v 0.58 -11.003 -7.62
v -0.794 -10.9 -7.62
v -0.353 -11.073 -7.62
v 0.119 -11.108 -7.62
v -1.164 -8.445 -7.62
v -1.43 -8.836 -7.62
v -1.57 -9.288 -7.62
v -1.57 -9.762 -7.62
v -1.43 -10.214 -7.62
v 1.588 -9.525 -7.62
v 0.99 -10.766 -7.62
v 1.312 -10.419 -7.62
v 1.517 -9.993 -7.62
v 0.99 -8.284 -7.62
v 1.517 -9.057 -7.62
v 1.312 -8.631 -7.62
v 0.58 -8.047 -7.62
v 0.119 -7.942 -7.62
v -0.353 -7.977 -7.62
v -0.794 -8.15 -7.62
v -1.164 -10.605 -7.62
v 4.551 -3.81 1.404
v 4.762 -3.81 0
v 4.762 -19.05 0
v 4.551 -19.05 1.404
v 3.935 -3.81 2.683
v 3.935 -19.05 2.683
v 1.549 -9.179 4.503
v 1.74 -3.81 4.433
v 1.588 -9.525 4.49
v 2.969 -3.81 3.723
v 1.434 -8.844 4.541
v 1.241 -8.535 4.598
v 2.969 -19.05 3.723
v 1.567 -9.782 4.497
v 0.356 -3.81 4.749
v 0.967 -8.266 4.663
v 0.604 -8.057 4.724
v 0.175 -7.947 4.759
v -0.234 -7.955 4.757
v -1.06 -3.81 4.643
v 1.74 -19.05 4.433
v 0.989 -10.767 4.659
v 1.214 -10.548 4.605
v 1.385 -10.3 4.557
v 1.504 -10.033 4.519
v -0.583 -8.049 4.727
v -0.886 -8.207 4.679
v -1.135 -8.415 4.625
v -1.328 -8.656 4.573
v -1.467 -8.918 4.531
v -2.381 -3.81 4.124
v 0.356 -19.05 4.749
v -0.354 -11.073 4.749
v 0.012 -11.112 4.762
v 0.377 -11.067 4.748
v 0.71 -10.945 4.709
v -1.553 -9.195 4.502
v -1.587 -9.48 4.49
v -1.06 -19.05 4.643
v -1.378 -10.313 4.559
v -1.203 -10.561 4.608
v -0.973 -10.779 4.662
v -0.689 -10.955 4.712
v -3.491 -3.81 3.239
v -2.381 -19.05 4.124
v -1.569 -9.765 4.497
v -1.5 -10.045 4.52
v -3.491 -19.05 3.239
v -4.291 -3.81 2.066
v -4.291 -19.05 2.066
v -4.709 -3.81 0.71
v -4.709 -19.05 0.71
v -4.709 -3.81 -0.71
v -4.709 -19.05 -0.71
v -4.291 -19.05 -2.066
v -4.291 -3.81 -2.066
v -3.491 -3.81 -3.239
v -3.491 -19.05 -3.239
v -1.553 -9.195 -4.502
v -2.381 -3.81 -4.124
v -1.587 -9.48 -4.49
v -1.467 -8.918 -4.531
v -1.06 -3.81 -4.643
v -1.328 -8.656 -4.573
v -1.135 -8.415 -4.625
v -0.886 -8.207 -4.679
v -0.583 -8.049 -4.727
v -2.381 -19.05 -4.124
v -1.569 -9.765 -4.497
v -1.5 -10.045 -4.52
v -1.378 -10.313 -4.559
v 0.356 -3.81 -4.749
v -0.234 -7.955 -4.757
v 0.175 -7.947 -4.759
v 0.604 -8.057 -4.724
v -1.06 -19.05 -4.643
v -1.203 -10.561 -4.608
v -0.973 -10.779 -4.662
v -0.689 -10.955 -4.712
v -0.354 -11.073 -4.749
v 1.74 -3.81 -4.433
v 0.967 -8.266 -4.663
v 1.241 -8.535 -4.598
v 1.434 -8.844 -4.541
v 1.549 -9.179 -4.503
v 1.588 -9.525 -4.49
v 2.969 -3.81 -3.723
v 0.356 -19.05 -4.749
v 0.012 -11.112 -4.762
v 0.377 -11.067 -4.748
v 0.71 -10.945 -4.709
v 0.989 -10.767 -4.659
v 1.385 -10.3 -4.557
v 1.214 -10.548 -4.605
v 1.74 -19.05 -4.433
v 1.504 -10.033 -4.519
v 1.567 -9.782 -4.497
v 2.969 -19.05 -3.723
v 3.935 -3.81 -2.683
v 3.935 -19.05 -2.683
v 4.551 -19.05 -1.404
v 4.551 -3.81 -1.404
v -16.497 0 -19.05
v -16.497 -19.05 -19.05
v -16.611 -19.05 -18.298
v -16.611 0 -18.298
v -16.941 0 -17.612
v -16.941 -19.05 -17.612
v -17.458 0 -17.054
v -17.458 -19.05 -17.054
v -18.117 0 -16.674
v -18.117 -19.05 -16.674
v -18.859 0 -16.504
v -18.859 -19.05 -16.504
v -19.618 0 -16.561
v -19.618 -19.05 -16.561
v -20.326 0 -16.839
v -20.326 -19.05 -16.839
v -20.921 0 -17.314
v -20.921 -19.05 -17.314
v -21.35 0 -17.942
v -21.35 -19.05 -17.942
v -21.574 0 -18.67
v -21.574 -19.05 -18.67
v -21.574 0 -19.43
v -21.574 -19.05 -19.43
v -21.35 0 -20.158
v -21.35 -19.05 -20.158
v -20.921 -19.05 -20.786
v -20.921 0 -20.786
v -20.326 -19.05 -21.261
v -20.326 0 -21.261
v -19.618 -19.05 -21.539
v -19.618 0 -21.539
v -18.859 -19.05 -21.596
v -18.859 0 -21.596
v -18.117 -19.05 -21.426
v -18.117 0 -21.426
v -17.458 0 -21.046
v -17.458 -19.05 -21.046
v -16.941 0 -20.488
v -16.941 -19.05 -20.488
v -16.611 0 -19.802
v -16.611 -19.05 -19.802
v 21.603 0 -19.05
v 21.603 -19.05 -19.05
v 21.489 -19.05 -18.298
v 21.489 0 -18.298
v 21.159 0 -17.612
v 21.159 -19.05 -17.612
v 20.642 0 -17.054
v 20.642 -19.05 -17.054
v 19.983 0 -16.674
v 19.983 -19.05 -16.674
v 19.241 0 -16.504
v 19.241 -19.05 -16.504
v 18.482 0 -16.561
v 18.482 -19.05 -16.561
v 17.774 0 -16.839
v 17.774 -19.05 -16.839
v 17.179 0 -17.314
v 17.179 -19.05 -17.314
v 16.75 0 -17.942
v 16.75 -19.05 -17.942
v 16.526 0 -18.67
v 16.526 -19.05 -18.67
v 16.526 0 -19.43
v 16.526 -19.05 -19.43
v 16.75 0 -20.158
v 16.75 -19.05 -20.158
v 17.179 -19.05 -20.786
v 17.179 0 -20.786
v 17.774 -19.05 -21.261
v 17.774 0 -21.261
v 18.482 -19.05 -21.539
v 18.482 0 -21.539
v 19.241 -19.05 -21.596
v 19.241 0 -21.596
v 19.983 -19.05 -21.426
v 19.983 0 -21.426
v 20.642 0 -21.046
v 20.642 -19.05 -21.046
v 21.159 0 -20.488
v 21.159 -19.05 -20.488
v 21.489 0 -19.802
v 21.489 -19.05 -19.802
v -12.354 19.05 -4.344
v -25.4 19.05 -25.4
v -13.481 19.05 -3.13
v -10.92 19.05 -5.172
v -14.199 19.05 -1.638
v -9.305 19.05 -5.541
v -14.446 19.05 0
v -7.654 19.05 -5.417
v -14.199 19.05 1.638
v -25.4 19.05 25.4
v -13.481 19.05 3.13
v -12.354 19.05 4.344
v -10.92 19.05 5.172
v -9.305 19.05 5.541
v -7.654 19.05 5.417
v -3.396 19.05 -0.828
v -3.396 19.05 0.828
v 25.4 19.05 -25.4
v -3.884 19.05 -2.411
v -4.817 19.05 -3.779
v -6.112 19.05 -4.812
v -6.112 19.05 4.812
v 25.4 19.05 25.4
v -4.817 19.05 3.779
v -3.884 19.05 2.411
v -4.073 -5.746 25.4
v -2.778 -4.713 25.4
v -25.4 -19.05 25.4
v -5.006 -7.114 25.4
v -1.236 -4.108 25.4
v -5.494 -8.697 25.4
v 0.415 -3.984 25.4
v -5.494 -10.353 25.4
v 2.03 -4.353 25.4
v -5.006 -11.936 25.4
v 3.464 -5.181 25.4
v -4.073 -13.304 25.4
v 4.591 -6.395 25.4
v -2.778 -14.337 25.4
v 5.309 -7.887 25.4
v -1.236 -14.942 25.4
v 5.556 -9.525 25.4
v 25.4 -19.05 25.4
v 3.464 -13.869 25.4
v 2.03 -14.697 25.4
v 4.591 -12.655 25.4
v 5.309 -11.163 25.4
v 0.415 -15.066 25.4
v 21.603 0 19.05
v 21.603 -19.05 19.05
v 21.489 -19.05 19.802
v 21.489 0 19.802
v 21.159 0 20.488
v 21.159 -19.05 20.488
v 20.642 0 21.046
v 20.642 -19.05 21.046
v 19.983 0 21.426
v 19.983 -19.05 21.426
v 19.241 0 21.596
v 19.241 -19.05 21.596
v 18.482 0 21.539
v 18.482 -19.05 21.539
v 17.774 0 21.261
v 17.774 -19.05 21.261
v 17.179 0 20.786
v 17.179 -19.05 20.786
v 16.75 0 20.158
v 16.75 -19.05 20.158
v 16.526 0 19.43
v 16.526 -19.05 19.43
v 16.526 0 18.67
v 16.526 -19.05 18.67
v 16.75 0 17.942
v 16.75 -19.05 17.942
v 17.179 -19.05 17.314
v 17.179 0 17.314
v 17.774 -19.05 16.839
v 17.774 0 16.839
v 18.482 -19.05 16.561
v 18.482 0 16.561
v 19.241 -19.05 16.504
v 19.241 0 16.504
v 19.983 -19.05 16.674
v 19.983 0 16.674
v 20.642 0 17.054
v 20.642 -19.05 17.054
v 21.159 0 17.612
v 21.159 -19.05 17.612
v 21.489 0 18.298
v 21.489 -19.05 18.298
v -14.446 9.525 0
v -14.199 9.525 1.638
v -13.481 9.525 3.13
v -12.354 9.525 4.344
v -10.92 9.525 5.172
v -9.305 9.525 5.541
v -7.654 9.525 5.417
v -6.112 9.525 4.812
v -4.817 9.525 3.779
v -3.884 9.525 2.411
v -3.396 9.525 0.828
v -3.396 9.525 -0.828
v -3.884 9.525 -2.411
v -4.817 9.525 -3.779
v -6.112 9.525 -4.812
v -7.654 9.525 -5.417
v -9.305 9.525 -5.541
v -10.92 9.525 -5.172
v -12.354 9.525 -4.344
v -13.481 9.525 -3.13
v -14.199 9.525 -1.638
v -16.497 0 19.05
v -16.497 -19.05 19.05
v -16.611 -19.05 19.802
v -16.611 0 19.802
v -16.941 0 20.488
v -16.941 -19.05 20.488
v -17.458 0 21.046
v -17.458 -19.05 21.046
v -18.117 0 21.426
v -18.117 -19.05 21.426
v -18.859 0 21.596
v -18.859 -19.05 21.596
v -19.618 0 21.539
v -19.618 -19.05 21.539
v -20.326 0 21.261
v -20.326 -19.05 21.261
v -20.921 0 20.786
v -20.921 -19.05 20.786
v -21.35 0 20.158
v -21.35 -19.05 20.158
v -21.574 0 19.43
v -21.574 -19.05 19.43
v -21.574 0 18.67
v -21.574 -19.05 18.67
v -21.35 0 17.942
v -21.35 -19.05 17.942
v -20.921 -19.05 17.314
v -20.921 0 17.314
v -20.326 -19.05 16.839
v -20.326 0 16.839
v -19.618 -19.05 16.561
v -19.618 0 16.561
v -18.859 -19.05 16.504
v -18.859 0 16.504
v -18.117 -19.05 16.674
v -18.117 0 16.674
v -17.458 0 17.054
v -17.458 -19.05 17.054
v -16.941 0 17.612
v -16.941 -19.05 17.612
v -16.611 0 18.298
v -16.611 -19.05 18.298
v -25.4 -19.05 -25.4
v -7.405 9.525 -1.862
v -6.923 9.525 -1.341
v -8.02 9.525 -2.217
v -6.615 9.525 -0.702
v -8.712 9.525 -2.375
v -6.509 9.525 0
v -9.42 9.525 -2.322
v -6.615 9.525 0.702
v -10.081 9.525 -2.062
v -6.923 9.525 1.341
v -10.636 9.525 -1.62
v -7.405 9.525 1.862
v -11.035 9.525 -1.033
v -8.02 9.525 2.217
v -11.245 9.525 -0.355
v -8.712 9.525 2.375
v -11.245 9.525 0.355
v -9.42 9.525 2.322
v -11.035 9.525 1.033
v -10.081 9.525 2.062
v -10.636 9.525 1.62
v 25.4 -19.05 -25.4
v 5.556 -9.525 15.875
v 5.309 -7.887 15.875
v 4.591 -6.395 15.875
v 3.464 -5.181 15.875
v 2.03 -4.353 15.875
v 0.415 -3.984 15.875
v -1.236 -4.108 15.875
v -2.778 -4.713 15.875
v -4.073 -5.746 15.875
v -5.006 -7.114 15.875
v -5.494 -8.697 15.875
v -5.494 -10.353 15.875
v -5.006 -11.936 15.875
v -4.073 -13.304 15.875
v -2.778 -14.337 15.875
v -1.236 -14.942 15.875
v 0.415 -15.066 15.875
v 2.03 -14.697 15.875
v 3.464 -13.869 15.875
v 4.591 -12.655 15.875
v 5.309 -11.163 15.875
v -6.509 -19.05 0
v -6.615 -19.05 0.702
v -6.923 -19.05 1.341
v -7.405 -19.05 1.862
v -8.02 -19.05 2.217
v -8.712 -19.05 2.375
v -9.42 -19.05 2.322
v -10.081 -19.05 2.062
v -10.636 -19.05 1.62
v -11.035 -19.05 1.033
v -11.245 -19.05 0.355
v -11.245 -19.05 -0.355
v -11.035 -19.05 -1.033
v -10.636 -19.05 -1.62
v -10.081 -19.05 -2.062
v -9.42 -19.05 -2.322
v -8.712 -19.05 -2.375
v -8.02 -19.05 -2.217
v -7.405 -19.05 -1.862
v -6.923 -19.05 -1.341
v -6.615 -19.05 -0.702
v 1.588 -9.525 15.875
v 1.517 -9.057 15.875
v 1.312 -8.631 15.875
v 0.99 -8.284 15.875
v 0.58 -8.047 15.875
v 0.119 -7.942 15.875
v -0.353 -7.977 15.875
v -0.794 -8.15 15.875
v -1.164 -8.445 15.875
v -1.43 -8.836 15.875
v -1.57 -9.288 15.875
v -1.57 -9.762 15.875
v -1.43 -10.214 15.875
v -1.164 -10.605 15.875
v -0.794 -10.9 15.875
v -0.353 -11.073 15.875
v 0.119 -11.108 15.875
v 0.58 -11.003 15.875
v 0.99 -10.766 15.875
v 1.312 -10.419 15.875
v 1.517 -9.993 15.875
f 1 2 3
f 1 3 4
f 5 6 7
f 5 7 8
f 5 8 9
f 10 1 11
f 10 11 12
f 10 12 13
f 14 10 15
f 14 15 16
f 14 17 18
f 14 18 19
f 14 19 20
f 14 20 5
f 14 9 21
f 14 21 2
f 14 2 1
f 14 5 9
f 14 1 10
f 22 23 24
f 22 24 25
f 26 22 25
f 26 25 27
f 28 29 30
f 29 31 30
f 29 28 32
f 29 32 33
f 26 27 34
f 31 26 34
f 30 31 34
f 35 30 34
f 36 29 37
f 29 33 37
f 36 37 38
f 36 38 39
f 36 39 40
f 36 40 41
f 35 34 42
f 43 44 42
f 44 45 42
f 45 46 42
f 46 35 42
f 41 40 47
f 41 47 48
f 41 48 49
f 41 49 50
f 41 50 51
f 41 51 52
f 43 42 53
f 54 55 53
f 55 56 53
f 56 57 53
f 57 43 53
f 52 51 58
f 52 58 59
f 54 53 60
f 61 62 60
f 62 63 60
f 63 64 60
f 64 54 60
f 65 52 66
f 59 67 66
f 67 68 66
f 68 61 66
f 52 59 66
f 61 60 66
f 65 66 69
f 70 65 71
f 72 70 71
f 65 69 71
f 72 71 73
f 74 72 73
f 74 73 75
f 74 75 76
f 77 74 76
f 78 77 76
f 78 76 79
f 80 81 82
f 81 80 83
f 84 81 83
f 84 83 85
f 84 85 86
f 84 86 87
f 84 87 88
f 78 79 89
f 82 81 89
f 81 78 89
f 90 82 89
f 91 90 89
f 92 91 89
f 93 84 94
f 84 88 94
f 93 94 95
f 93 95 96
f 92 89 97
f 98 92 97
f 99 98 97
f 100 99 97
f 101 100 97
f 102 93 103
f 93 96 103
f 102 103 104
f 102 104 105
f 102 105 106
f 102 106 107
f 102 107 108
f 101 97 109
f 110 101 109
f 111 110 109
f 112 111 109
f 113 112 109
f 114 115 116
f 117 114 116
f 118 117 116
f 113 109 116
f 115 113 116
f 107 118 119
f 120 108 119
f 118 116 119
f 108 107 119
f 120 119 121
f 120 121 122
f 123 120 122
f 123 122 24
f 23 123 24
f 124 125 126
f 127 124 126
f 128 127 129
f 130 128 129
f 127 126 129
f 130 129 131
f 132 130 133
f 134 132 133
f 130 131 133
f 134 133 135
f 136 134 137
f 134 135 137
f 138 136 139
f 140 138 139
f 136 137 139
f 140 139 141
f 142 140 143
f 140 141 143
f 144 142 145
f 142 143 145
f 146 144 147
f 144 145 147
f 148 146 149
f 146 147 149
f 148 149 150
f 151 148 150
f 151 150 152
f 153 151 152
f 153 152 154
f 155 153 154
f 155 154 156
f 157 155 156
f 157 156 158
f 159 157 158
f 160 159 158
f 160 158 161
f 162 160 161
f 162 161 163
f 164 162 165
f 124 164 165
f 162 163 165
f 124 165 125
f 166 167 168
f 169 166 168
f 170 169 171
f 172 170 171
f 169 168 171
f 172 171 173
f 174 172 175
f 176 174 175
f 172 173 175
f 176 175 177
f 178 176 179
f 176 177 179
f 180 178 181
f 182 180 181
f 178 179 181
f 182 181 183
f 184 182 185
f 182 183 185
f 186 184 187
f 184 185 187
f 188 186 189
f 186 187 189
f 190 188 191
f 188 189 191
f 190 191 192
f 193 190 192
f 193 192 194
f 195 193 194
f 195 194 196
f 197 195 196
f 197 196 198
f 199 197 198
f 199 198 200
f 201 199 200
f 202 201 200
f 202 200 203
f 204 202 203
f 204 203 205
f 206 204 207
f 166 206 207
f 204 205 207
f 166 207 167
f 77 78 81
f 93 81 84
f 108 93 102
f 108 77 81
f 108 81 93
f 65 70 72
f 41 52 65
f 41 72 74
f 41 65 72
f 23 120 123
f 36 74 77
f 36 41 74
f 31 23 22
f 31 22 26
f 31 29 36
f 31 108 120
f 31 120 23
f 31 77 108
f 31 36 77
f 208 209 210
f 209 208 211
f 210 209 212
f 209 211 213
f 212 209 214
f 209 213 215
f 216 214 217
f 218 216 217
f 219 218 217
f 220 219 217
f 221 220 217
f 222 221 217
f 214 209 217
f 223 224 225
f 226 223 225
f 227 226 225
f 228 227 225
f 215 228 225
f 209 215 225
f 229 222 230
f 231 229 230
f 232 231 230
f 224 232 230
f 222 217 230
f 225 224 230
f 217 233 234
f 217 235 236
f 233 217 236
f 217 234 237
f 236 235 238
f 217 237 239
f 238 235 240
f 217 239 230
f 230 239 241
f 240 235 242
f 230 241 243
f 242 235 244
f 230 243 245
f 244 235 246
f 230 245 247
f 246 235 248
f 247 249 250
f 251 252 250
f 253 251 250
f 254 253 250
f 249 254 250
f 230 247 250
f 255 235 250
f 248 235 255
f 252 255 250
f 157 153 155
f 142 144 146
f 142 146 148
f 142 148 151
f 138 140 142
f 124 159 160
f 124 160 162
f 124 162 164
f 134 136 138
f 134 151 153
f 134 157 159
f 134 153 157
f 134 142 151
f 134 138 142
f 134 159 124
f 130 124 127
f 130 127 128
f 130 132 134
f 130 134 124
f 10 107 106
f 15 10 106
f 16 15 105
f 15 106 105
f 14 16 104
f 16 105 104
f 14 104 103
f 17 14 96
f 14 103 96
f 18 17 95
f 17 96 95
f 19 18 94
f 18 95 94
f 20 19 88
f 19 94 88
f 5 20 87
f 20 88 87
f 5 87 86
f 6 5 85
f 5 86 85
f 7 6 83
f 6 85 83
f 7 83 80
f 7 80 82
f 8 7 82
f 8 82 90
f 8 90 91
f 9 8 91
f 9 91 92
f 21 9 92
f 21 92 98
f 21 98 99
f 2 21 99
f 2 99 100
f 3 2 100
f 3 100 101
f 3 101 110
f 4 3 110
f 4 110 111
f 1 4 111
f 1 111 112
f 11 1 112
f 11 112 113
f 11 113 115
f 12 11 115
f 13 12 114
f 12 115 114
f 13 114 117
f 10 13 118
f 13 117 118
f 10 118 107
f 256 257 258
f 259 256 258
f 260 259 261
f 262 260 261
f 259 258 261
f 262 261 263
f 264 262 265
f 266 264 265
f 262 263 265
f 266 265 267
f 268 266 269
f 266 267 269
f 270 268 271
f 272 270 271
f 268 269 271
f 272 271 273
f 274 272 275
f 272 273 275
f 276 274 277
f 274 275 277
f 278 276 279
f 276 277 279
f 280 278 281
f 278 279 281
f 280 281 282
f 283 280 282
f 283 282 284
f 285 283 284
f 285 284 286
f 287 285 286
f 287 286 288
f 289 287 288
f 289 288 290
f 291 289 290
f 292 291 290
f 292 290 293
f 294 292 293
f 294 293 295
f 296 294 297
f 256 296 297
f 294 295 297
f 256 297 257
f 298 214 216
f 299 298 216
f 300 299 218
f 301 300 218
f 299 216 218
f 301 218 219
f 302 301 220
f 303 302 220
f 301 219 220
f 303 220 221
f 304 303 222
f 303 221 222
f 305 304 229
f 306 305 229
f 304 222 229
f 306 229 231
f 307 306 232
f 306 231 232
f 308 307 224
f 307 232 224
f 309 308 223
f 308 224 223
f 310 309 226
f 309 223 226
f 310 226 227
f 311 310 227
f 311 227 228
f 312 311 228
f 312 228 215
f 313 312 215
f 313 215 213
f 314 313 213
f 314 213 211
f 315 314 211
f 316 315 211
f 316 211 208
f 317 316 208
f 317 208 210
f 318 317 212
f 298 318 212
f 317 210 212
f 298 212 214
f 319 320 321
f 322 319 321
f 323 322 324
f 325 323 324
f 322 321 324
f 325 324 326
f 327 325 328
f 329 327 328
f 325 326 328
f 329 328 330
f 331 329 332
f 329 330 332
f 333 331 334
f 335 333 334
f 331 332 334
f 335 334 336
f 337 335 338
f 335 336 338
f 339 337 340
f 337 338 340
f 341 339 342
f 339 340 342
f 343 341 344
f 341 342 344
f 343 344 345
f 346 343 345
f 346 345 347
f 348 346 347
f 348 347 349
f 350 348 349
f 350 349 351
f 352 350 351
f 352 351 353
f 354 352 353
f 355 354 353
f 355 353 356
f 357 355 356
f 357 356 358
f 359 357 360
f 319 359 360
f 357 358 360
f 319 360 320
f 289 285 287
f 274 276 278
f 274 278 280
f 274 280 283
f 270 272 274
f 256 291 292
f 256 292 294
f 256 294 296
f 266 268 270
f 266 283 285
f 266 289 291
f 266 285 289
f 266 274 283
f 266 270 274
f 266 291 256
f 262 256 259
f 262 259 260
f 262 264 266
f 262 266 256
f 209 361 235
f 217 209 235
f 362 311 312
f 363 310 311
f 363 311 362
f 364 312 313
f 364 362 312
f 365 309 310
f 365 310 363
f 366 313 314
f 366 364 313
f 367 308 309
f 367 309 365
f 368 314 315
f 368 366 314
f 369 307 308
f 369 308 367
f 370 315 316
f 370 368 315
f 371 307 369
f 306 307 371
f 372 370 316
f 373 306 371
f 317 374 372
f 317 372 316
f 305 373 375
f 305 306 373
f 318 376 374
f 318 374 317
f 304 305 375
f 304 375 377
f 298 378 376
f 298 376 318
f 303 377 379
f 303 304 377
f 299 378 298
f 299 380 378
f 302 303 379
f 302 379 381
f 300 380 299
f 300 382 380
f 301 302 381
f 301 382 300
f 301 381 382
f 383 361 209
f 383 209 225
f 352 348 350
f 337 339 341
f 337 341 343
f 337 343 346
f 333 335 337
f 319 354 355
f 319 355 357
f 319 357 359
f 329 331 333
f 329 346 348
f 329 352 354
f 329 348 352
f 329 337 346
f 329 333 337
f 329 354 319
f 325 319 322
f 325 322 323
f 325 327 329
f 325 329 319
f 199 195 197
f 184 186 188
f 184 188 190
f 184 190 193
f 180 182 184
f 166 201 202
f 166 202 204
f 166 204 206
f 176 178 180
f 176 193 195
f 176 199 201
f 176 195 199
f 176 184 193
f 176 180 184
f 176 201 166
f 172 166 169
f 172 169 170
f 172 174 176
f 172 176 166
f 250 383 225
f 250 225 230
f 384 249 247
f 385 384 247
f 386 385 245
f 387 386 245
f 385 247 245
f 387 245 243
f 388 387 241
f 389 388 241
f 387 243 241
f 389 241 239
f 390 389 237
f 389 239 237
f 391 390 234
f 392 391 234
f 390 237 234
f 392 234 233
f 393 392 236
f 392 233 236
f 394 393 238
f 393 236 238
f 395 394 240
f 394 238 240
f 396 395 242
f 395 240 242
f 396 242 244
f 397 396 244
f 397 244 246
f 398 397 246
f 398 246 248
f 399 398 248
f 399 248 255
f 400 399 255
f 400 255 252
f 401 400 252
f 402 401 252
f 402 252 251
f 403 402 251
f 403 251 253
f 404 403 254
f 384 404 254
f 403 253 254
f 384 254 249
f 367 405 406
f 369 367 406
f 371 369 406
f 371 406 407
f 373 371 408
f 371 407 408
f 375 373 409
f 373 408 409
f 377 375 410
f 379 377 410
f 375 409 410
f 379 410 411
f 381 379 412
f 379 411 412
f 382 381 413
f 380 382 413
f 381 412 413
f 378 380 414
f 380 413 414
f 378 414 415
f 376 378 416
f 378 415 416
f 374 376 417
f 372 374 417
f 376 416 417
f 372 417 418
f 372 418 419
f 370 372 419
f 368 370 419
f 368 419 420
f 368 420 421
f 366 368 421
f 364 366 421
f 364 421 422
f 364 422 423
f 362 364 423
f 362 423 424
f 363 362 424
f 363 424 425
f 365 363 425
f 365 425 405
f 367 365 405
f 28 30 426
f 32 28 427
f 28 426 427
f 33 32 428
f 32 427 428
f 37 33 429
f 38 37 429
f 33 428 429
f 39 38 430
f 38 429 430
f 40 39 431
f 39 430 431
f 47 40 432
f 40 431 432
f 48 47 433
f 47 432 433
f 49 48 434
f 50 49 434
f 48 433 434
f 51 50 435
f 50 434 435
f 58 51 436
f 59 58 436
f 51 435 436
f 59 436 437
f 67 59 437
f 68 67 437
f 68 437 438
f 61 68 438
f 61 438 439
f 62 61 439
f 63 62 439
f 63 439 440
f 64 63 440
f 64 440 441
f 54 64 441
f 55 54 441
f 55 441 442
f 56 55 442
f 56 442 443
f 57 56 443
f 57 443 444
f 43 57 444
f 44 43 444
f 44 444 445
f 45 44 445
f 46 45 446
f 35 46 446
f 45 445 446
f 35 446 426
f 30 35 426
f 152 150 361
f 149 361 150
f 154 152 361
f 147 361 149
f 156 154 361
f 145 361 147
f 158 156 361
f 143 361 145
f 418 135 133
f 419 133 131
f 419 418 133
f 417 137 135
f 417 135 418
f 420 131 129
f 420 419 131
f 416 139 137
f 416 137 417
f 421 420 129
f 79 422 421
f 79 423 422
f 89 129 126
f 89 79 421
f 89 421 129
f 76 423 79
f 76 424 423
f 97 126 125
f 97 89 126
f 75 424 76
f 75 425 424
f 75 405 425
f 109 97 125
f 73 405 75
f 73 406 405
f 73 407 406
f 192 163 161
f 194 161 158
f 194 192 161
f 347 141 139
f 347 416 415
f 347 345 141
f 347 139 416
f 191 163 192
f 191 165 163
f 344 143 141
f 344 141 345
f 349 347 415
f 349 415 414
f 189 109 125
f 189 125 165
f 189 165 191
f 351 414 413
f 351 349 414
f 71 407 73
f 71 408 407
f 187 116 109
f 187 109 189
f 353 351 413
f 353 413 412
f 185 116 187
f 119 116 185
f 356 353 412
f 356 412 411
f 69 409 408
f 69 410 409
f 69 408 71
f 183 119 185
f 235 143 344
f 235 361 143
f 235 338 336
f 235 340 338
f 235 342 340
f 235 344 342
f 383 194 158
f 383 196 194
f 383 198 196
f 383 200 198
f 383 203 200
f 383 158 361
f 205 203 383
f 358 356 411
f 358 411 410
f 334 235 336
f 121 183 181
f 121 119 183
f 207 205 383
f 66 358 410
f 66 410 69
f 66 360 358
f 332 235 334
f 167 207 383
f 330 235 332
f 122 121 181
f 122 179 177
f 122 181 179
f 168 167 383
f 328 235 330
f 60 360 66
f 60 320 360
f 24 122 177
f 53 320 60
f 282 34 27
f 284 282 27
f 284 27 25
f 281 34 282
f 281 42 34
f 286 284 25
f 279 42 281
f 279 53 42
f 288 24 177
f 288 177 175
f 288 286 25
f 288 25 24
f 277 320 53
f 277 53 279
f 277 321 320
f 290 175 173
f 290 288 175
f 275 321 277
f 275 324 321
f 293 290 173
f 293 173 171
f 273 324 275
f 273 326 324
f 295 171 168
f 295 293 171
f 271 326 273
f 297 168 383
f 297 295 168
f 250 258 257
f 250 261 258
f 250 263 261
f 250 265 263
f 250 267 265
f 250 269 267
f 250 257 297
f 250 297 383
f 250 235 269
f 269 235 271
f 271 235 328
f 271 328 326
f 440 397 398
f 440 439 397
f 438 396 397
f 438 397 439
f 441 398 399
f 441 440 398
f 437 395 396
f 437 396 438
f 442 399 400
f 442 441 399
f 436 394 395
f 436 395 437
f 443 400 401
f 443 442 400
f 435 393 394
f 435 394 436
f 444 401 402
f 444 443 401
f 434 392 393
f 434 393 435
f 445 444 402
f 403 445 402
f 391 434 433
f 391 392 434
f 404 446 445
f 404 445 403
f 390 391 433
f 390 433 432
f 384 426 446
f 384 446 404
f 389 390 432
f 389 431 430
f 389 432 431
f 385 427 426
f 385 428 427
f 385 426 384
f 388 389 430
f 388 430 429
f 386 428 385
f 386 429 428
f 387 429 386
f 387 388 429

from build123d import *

# Parameters (mm, degrees)
F0_W      = 50.8
F0_H      = 50.8
F1_DEPTH  = 19.05
F2_R      = 4.7625
F3_DEPTH  = 15.24
F4_R      = 1.5875
F5_DEPTH  = 33.02
F6_R      = 5.55625
F7_DEPTH  = 9.525
F8_R      = 2.38125
F9_DEPTH  = 38.1
F10_R     = 5.55625
F11_DEPTH = 9.525
F12_R     = 2.5527
F13_DEPTH = 19.05


with BuildPart() as f1:
    # F0 (on Front) → F1 (new body, symmetric)
    with BuildSketch(Plane.XZ):
        Rectangle(F0_W, F0_H)
    extrude(amount=F1_DEPTH, both=True)

    # F2 (on face) → F3 (cut)
    with BuildSketch(Plane.XZ.offset(19.05)):
        Circle(F2_R)
    extrude(amount=-F3_DEPTH, mode=Mode.SUBTRACT)

    # F4 (on face) → F5 (cut)
    with BuildSketch(Plane.XY.offset(25.4)):
        with Locations((0, -9.525)):
            Circle(F4_R)
    extrude(amount=-F5_DEPTH, mode=Mode.SUBTRACT)

    # F6 (on face) → F7 (cut)
    with BuildSketch(Plane.XY.offset(25.4)):
        with Locations((0, -9.525)):
            Circle(F6_R)
    extrude(amount=-F7_DEPTH, mode=Mode.SUBTRACT)

    # F8 (on face) → F9 (cut, through all)
    with BuildSketch(Plane.XZ.offset(19.05)):
        with Locations((-8.89, 0)):
            Circle(F8_R)
    extrude(amount=-F9_DEPTH, mode=Mode.SUBTRACT)

    # F10 (on face) → F11 (cut)
    with BuildSketch(Plane(origin=(0, 19.05, 0), x_dir=(-1, 0, 0), z_dir=(0, 1, 0))):
        with Locations((8.89, 0)):
            Circle(F10_R)
    extrude(amount=-F11_DEPTH, mode=Mode.SUBTRACT)

    # F12 (on face) → F13 (cut)
    with BuildSketch(Plane.XZ.offset(19.05)):
        with Locations((-19.05, 19.05)):
            Circle(F12_R)
        with Locations((19.05, 19.05)):
            Circle(F12_R)
        with Locations((-19.05, -19.05)):
            Circle(F12_R)
        with Locations((19.05, -19.05)):
            Circle(F12_R)
    extrude(amount=-F13_DEPTH, mode=Mode.SUBTRACT)


solid = f1.part
